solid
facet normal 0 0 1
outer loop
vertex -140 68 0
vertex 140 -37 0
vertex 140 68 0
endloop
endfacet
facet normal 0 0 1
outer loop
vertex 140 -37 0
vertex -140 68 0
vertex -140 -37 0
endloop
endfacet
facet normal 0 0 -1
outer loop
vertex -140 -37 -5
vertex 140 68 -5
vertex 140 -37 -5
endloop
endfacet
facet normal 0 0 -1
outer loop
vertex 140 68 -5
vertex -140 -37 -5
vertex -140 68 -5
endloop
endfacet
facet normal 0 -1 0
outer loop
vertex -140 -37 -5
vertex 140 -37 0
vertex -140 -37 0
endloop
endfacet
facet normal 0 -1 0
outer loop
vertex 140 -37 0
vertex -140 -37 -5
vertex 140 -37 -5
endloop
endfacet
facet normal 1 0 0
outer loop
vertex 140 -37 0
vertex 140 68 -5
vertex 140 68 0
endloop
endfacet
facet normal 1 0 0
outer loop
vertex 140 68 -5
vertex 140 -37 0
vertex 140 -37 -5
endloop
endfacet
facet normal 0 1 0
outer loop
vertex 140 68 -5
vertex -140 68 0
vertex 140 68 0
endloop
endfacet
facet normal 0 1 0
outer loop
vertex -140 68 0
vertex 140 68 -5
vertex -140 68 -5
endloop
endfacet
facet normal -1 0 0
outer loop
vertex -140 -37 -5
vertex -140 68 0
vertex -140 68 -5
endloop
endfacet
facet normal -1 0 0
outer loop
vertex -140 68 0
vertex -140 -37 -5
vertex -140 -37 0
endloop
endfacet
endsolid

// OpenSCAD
mode = 1; // changes what geometry is drawn (see cutout module for details)

/////////////////////////
// Required Dimensions //
//       (in mm)       //
/////////////////////////

spacing = 1.05;
s1 = 18; // 1u
s1_25 = s1*1.25; // 1.25u
key1 = s1 + spacing; // center-center distance between 1u keys
key1_25 = s1_25 + spacing;


/////////////////////////////
// "Building" the Keyboard //
/////////////////////////////

//cutout(pos = [10,-75,0],rot = -10,size = s1_25); // Example of cutout usage
translate([0,15.5,-2.5]) color([1,1,1]) cube([280,105,5],true); // bounding box
half(); mirror([1,0,0]) color("grey") half();

module half () {
    rotate(8.5) translate([1.75,0,0]*key1) {
        color("yellow") mainBlock();
        color("red") bottomRow();
        color("blue") inside();
        color("green") outside();
    }
}

module mainBlock () {
    block([3,5],[0,0.125,0.25,0.125,-0.125]);
}

module bottomRow () {
    translate([0,-1,0]*key1) {
        translate([1,0,0]*key1) block([1,4],[.125,.25,.125,-.125,-.125]); // 5 in line
        movx = -0.05;
        movy = movx - 0.01;
        rot = 7.5;
        translate([movx,movy,0]*key1) rotate(rot) {
           cutout(); // 1st thumb key
            translate([movx-1.01,movy,0]*key1) rotate(rot) {
                cutout(pos = [0,0.125,0]*key1,rot = 90,size = s1_25); // 2nd thumb key
            }
        }
    }
}

module inside () {
    translate([-1,0.1,0]*key1) block([2,1]);
}

module outside () {
    translate([5,-0.125,0]*key1) block([3,1]);
}


////////////////////////////
//   "Function" Modules   //
////////////////////////////

module block (size = [1,1],shift) {
    // size: [rows, columns]
    // shift: the absolute vertical shift, per column. 1 = 100% = 1 row up
    rows = size[0];
    columns = size[1];
    for(row = [1:rows]) {
        for(column = [1:columns]) {
            if (len(shift) == undef) { // if shift is not defined
                scaledpos = [column-1,row-1,0]*key1;
                cutout(scaledpos,0);
            } else { // shift is defined
                scaledpos = [column-1,row-1+shift[column-1],0]*key1;
                cutout(scaledpos,0);
            }
        }
    }
}

module cutout (pos=[0,0,0],rot=0,size=s1) {
    // pos: the coordinate of the center of the cutout
    // rot: the CCW rotation, in degrees, of the cutout
    // size: key size, in units
    translate(pos) rotate(rot) union() {
        if (mode == 1) { // keycap silhouette
            square([size,s1],true);
        } else if (mode == 2) { // clearance silhouette
            square([size+spacing,key1],true);
        } else { // cutout in proper location
            translate([(size-s1)/2,0,0]) {
                square(14,true);
                translate([0,14/2-1-3.1/2]) square([14+2*.8,3.1],true);
                translate([0,-(14/2-1-3.1/2)]) square([14+2*.8,3.1],true);
            }
        }
    }
}
